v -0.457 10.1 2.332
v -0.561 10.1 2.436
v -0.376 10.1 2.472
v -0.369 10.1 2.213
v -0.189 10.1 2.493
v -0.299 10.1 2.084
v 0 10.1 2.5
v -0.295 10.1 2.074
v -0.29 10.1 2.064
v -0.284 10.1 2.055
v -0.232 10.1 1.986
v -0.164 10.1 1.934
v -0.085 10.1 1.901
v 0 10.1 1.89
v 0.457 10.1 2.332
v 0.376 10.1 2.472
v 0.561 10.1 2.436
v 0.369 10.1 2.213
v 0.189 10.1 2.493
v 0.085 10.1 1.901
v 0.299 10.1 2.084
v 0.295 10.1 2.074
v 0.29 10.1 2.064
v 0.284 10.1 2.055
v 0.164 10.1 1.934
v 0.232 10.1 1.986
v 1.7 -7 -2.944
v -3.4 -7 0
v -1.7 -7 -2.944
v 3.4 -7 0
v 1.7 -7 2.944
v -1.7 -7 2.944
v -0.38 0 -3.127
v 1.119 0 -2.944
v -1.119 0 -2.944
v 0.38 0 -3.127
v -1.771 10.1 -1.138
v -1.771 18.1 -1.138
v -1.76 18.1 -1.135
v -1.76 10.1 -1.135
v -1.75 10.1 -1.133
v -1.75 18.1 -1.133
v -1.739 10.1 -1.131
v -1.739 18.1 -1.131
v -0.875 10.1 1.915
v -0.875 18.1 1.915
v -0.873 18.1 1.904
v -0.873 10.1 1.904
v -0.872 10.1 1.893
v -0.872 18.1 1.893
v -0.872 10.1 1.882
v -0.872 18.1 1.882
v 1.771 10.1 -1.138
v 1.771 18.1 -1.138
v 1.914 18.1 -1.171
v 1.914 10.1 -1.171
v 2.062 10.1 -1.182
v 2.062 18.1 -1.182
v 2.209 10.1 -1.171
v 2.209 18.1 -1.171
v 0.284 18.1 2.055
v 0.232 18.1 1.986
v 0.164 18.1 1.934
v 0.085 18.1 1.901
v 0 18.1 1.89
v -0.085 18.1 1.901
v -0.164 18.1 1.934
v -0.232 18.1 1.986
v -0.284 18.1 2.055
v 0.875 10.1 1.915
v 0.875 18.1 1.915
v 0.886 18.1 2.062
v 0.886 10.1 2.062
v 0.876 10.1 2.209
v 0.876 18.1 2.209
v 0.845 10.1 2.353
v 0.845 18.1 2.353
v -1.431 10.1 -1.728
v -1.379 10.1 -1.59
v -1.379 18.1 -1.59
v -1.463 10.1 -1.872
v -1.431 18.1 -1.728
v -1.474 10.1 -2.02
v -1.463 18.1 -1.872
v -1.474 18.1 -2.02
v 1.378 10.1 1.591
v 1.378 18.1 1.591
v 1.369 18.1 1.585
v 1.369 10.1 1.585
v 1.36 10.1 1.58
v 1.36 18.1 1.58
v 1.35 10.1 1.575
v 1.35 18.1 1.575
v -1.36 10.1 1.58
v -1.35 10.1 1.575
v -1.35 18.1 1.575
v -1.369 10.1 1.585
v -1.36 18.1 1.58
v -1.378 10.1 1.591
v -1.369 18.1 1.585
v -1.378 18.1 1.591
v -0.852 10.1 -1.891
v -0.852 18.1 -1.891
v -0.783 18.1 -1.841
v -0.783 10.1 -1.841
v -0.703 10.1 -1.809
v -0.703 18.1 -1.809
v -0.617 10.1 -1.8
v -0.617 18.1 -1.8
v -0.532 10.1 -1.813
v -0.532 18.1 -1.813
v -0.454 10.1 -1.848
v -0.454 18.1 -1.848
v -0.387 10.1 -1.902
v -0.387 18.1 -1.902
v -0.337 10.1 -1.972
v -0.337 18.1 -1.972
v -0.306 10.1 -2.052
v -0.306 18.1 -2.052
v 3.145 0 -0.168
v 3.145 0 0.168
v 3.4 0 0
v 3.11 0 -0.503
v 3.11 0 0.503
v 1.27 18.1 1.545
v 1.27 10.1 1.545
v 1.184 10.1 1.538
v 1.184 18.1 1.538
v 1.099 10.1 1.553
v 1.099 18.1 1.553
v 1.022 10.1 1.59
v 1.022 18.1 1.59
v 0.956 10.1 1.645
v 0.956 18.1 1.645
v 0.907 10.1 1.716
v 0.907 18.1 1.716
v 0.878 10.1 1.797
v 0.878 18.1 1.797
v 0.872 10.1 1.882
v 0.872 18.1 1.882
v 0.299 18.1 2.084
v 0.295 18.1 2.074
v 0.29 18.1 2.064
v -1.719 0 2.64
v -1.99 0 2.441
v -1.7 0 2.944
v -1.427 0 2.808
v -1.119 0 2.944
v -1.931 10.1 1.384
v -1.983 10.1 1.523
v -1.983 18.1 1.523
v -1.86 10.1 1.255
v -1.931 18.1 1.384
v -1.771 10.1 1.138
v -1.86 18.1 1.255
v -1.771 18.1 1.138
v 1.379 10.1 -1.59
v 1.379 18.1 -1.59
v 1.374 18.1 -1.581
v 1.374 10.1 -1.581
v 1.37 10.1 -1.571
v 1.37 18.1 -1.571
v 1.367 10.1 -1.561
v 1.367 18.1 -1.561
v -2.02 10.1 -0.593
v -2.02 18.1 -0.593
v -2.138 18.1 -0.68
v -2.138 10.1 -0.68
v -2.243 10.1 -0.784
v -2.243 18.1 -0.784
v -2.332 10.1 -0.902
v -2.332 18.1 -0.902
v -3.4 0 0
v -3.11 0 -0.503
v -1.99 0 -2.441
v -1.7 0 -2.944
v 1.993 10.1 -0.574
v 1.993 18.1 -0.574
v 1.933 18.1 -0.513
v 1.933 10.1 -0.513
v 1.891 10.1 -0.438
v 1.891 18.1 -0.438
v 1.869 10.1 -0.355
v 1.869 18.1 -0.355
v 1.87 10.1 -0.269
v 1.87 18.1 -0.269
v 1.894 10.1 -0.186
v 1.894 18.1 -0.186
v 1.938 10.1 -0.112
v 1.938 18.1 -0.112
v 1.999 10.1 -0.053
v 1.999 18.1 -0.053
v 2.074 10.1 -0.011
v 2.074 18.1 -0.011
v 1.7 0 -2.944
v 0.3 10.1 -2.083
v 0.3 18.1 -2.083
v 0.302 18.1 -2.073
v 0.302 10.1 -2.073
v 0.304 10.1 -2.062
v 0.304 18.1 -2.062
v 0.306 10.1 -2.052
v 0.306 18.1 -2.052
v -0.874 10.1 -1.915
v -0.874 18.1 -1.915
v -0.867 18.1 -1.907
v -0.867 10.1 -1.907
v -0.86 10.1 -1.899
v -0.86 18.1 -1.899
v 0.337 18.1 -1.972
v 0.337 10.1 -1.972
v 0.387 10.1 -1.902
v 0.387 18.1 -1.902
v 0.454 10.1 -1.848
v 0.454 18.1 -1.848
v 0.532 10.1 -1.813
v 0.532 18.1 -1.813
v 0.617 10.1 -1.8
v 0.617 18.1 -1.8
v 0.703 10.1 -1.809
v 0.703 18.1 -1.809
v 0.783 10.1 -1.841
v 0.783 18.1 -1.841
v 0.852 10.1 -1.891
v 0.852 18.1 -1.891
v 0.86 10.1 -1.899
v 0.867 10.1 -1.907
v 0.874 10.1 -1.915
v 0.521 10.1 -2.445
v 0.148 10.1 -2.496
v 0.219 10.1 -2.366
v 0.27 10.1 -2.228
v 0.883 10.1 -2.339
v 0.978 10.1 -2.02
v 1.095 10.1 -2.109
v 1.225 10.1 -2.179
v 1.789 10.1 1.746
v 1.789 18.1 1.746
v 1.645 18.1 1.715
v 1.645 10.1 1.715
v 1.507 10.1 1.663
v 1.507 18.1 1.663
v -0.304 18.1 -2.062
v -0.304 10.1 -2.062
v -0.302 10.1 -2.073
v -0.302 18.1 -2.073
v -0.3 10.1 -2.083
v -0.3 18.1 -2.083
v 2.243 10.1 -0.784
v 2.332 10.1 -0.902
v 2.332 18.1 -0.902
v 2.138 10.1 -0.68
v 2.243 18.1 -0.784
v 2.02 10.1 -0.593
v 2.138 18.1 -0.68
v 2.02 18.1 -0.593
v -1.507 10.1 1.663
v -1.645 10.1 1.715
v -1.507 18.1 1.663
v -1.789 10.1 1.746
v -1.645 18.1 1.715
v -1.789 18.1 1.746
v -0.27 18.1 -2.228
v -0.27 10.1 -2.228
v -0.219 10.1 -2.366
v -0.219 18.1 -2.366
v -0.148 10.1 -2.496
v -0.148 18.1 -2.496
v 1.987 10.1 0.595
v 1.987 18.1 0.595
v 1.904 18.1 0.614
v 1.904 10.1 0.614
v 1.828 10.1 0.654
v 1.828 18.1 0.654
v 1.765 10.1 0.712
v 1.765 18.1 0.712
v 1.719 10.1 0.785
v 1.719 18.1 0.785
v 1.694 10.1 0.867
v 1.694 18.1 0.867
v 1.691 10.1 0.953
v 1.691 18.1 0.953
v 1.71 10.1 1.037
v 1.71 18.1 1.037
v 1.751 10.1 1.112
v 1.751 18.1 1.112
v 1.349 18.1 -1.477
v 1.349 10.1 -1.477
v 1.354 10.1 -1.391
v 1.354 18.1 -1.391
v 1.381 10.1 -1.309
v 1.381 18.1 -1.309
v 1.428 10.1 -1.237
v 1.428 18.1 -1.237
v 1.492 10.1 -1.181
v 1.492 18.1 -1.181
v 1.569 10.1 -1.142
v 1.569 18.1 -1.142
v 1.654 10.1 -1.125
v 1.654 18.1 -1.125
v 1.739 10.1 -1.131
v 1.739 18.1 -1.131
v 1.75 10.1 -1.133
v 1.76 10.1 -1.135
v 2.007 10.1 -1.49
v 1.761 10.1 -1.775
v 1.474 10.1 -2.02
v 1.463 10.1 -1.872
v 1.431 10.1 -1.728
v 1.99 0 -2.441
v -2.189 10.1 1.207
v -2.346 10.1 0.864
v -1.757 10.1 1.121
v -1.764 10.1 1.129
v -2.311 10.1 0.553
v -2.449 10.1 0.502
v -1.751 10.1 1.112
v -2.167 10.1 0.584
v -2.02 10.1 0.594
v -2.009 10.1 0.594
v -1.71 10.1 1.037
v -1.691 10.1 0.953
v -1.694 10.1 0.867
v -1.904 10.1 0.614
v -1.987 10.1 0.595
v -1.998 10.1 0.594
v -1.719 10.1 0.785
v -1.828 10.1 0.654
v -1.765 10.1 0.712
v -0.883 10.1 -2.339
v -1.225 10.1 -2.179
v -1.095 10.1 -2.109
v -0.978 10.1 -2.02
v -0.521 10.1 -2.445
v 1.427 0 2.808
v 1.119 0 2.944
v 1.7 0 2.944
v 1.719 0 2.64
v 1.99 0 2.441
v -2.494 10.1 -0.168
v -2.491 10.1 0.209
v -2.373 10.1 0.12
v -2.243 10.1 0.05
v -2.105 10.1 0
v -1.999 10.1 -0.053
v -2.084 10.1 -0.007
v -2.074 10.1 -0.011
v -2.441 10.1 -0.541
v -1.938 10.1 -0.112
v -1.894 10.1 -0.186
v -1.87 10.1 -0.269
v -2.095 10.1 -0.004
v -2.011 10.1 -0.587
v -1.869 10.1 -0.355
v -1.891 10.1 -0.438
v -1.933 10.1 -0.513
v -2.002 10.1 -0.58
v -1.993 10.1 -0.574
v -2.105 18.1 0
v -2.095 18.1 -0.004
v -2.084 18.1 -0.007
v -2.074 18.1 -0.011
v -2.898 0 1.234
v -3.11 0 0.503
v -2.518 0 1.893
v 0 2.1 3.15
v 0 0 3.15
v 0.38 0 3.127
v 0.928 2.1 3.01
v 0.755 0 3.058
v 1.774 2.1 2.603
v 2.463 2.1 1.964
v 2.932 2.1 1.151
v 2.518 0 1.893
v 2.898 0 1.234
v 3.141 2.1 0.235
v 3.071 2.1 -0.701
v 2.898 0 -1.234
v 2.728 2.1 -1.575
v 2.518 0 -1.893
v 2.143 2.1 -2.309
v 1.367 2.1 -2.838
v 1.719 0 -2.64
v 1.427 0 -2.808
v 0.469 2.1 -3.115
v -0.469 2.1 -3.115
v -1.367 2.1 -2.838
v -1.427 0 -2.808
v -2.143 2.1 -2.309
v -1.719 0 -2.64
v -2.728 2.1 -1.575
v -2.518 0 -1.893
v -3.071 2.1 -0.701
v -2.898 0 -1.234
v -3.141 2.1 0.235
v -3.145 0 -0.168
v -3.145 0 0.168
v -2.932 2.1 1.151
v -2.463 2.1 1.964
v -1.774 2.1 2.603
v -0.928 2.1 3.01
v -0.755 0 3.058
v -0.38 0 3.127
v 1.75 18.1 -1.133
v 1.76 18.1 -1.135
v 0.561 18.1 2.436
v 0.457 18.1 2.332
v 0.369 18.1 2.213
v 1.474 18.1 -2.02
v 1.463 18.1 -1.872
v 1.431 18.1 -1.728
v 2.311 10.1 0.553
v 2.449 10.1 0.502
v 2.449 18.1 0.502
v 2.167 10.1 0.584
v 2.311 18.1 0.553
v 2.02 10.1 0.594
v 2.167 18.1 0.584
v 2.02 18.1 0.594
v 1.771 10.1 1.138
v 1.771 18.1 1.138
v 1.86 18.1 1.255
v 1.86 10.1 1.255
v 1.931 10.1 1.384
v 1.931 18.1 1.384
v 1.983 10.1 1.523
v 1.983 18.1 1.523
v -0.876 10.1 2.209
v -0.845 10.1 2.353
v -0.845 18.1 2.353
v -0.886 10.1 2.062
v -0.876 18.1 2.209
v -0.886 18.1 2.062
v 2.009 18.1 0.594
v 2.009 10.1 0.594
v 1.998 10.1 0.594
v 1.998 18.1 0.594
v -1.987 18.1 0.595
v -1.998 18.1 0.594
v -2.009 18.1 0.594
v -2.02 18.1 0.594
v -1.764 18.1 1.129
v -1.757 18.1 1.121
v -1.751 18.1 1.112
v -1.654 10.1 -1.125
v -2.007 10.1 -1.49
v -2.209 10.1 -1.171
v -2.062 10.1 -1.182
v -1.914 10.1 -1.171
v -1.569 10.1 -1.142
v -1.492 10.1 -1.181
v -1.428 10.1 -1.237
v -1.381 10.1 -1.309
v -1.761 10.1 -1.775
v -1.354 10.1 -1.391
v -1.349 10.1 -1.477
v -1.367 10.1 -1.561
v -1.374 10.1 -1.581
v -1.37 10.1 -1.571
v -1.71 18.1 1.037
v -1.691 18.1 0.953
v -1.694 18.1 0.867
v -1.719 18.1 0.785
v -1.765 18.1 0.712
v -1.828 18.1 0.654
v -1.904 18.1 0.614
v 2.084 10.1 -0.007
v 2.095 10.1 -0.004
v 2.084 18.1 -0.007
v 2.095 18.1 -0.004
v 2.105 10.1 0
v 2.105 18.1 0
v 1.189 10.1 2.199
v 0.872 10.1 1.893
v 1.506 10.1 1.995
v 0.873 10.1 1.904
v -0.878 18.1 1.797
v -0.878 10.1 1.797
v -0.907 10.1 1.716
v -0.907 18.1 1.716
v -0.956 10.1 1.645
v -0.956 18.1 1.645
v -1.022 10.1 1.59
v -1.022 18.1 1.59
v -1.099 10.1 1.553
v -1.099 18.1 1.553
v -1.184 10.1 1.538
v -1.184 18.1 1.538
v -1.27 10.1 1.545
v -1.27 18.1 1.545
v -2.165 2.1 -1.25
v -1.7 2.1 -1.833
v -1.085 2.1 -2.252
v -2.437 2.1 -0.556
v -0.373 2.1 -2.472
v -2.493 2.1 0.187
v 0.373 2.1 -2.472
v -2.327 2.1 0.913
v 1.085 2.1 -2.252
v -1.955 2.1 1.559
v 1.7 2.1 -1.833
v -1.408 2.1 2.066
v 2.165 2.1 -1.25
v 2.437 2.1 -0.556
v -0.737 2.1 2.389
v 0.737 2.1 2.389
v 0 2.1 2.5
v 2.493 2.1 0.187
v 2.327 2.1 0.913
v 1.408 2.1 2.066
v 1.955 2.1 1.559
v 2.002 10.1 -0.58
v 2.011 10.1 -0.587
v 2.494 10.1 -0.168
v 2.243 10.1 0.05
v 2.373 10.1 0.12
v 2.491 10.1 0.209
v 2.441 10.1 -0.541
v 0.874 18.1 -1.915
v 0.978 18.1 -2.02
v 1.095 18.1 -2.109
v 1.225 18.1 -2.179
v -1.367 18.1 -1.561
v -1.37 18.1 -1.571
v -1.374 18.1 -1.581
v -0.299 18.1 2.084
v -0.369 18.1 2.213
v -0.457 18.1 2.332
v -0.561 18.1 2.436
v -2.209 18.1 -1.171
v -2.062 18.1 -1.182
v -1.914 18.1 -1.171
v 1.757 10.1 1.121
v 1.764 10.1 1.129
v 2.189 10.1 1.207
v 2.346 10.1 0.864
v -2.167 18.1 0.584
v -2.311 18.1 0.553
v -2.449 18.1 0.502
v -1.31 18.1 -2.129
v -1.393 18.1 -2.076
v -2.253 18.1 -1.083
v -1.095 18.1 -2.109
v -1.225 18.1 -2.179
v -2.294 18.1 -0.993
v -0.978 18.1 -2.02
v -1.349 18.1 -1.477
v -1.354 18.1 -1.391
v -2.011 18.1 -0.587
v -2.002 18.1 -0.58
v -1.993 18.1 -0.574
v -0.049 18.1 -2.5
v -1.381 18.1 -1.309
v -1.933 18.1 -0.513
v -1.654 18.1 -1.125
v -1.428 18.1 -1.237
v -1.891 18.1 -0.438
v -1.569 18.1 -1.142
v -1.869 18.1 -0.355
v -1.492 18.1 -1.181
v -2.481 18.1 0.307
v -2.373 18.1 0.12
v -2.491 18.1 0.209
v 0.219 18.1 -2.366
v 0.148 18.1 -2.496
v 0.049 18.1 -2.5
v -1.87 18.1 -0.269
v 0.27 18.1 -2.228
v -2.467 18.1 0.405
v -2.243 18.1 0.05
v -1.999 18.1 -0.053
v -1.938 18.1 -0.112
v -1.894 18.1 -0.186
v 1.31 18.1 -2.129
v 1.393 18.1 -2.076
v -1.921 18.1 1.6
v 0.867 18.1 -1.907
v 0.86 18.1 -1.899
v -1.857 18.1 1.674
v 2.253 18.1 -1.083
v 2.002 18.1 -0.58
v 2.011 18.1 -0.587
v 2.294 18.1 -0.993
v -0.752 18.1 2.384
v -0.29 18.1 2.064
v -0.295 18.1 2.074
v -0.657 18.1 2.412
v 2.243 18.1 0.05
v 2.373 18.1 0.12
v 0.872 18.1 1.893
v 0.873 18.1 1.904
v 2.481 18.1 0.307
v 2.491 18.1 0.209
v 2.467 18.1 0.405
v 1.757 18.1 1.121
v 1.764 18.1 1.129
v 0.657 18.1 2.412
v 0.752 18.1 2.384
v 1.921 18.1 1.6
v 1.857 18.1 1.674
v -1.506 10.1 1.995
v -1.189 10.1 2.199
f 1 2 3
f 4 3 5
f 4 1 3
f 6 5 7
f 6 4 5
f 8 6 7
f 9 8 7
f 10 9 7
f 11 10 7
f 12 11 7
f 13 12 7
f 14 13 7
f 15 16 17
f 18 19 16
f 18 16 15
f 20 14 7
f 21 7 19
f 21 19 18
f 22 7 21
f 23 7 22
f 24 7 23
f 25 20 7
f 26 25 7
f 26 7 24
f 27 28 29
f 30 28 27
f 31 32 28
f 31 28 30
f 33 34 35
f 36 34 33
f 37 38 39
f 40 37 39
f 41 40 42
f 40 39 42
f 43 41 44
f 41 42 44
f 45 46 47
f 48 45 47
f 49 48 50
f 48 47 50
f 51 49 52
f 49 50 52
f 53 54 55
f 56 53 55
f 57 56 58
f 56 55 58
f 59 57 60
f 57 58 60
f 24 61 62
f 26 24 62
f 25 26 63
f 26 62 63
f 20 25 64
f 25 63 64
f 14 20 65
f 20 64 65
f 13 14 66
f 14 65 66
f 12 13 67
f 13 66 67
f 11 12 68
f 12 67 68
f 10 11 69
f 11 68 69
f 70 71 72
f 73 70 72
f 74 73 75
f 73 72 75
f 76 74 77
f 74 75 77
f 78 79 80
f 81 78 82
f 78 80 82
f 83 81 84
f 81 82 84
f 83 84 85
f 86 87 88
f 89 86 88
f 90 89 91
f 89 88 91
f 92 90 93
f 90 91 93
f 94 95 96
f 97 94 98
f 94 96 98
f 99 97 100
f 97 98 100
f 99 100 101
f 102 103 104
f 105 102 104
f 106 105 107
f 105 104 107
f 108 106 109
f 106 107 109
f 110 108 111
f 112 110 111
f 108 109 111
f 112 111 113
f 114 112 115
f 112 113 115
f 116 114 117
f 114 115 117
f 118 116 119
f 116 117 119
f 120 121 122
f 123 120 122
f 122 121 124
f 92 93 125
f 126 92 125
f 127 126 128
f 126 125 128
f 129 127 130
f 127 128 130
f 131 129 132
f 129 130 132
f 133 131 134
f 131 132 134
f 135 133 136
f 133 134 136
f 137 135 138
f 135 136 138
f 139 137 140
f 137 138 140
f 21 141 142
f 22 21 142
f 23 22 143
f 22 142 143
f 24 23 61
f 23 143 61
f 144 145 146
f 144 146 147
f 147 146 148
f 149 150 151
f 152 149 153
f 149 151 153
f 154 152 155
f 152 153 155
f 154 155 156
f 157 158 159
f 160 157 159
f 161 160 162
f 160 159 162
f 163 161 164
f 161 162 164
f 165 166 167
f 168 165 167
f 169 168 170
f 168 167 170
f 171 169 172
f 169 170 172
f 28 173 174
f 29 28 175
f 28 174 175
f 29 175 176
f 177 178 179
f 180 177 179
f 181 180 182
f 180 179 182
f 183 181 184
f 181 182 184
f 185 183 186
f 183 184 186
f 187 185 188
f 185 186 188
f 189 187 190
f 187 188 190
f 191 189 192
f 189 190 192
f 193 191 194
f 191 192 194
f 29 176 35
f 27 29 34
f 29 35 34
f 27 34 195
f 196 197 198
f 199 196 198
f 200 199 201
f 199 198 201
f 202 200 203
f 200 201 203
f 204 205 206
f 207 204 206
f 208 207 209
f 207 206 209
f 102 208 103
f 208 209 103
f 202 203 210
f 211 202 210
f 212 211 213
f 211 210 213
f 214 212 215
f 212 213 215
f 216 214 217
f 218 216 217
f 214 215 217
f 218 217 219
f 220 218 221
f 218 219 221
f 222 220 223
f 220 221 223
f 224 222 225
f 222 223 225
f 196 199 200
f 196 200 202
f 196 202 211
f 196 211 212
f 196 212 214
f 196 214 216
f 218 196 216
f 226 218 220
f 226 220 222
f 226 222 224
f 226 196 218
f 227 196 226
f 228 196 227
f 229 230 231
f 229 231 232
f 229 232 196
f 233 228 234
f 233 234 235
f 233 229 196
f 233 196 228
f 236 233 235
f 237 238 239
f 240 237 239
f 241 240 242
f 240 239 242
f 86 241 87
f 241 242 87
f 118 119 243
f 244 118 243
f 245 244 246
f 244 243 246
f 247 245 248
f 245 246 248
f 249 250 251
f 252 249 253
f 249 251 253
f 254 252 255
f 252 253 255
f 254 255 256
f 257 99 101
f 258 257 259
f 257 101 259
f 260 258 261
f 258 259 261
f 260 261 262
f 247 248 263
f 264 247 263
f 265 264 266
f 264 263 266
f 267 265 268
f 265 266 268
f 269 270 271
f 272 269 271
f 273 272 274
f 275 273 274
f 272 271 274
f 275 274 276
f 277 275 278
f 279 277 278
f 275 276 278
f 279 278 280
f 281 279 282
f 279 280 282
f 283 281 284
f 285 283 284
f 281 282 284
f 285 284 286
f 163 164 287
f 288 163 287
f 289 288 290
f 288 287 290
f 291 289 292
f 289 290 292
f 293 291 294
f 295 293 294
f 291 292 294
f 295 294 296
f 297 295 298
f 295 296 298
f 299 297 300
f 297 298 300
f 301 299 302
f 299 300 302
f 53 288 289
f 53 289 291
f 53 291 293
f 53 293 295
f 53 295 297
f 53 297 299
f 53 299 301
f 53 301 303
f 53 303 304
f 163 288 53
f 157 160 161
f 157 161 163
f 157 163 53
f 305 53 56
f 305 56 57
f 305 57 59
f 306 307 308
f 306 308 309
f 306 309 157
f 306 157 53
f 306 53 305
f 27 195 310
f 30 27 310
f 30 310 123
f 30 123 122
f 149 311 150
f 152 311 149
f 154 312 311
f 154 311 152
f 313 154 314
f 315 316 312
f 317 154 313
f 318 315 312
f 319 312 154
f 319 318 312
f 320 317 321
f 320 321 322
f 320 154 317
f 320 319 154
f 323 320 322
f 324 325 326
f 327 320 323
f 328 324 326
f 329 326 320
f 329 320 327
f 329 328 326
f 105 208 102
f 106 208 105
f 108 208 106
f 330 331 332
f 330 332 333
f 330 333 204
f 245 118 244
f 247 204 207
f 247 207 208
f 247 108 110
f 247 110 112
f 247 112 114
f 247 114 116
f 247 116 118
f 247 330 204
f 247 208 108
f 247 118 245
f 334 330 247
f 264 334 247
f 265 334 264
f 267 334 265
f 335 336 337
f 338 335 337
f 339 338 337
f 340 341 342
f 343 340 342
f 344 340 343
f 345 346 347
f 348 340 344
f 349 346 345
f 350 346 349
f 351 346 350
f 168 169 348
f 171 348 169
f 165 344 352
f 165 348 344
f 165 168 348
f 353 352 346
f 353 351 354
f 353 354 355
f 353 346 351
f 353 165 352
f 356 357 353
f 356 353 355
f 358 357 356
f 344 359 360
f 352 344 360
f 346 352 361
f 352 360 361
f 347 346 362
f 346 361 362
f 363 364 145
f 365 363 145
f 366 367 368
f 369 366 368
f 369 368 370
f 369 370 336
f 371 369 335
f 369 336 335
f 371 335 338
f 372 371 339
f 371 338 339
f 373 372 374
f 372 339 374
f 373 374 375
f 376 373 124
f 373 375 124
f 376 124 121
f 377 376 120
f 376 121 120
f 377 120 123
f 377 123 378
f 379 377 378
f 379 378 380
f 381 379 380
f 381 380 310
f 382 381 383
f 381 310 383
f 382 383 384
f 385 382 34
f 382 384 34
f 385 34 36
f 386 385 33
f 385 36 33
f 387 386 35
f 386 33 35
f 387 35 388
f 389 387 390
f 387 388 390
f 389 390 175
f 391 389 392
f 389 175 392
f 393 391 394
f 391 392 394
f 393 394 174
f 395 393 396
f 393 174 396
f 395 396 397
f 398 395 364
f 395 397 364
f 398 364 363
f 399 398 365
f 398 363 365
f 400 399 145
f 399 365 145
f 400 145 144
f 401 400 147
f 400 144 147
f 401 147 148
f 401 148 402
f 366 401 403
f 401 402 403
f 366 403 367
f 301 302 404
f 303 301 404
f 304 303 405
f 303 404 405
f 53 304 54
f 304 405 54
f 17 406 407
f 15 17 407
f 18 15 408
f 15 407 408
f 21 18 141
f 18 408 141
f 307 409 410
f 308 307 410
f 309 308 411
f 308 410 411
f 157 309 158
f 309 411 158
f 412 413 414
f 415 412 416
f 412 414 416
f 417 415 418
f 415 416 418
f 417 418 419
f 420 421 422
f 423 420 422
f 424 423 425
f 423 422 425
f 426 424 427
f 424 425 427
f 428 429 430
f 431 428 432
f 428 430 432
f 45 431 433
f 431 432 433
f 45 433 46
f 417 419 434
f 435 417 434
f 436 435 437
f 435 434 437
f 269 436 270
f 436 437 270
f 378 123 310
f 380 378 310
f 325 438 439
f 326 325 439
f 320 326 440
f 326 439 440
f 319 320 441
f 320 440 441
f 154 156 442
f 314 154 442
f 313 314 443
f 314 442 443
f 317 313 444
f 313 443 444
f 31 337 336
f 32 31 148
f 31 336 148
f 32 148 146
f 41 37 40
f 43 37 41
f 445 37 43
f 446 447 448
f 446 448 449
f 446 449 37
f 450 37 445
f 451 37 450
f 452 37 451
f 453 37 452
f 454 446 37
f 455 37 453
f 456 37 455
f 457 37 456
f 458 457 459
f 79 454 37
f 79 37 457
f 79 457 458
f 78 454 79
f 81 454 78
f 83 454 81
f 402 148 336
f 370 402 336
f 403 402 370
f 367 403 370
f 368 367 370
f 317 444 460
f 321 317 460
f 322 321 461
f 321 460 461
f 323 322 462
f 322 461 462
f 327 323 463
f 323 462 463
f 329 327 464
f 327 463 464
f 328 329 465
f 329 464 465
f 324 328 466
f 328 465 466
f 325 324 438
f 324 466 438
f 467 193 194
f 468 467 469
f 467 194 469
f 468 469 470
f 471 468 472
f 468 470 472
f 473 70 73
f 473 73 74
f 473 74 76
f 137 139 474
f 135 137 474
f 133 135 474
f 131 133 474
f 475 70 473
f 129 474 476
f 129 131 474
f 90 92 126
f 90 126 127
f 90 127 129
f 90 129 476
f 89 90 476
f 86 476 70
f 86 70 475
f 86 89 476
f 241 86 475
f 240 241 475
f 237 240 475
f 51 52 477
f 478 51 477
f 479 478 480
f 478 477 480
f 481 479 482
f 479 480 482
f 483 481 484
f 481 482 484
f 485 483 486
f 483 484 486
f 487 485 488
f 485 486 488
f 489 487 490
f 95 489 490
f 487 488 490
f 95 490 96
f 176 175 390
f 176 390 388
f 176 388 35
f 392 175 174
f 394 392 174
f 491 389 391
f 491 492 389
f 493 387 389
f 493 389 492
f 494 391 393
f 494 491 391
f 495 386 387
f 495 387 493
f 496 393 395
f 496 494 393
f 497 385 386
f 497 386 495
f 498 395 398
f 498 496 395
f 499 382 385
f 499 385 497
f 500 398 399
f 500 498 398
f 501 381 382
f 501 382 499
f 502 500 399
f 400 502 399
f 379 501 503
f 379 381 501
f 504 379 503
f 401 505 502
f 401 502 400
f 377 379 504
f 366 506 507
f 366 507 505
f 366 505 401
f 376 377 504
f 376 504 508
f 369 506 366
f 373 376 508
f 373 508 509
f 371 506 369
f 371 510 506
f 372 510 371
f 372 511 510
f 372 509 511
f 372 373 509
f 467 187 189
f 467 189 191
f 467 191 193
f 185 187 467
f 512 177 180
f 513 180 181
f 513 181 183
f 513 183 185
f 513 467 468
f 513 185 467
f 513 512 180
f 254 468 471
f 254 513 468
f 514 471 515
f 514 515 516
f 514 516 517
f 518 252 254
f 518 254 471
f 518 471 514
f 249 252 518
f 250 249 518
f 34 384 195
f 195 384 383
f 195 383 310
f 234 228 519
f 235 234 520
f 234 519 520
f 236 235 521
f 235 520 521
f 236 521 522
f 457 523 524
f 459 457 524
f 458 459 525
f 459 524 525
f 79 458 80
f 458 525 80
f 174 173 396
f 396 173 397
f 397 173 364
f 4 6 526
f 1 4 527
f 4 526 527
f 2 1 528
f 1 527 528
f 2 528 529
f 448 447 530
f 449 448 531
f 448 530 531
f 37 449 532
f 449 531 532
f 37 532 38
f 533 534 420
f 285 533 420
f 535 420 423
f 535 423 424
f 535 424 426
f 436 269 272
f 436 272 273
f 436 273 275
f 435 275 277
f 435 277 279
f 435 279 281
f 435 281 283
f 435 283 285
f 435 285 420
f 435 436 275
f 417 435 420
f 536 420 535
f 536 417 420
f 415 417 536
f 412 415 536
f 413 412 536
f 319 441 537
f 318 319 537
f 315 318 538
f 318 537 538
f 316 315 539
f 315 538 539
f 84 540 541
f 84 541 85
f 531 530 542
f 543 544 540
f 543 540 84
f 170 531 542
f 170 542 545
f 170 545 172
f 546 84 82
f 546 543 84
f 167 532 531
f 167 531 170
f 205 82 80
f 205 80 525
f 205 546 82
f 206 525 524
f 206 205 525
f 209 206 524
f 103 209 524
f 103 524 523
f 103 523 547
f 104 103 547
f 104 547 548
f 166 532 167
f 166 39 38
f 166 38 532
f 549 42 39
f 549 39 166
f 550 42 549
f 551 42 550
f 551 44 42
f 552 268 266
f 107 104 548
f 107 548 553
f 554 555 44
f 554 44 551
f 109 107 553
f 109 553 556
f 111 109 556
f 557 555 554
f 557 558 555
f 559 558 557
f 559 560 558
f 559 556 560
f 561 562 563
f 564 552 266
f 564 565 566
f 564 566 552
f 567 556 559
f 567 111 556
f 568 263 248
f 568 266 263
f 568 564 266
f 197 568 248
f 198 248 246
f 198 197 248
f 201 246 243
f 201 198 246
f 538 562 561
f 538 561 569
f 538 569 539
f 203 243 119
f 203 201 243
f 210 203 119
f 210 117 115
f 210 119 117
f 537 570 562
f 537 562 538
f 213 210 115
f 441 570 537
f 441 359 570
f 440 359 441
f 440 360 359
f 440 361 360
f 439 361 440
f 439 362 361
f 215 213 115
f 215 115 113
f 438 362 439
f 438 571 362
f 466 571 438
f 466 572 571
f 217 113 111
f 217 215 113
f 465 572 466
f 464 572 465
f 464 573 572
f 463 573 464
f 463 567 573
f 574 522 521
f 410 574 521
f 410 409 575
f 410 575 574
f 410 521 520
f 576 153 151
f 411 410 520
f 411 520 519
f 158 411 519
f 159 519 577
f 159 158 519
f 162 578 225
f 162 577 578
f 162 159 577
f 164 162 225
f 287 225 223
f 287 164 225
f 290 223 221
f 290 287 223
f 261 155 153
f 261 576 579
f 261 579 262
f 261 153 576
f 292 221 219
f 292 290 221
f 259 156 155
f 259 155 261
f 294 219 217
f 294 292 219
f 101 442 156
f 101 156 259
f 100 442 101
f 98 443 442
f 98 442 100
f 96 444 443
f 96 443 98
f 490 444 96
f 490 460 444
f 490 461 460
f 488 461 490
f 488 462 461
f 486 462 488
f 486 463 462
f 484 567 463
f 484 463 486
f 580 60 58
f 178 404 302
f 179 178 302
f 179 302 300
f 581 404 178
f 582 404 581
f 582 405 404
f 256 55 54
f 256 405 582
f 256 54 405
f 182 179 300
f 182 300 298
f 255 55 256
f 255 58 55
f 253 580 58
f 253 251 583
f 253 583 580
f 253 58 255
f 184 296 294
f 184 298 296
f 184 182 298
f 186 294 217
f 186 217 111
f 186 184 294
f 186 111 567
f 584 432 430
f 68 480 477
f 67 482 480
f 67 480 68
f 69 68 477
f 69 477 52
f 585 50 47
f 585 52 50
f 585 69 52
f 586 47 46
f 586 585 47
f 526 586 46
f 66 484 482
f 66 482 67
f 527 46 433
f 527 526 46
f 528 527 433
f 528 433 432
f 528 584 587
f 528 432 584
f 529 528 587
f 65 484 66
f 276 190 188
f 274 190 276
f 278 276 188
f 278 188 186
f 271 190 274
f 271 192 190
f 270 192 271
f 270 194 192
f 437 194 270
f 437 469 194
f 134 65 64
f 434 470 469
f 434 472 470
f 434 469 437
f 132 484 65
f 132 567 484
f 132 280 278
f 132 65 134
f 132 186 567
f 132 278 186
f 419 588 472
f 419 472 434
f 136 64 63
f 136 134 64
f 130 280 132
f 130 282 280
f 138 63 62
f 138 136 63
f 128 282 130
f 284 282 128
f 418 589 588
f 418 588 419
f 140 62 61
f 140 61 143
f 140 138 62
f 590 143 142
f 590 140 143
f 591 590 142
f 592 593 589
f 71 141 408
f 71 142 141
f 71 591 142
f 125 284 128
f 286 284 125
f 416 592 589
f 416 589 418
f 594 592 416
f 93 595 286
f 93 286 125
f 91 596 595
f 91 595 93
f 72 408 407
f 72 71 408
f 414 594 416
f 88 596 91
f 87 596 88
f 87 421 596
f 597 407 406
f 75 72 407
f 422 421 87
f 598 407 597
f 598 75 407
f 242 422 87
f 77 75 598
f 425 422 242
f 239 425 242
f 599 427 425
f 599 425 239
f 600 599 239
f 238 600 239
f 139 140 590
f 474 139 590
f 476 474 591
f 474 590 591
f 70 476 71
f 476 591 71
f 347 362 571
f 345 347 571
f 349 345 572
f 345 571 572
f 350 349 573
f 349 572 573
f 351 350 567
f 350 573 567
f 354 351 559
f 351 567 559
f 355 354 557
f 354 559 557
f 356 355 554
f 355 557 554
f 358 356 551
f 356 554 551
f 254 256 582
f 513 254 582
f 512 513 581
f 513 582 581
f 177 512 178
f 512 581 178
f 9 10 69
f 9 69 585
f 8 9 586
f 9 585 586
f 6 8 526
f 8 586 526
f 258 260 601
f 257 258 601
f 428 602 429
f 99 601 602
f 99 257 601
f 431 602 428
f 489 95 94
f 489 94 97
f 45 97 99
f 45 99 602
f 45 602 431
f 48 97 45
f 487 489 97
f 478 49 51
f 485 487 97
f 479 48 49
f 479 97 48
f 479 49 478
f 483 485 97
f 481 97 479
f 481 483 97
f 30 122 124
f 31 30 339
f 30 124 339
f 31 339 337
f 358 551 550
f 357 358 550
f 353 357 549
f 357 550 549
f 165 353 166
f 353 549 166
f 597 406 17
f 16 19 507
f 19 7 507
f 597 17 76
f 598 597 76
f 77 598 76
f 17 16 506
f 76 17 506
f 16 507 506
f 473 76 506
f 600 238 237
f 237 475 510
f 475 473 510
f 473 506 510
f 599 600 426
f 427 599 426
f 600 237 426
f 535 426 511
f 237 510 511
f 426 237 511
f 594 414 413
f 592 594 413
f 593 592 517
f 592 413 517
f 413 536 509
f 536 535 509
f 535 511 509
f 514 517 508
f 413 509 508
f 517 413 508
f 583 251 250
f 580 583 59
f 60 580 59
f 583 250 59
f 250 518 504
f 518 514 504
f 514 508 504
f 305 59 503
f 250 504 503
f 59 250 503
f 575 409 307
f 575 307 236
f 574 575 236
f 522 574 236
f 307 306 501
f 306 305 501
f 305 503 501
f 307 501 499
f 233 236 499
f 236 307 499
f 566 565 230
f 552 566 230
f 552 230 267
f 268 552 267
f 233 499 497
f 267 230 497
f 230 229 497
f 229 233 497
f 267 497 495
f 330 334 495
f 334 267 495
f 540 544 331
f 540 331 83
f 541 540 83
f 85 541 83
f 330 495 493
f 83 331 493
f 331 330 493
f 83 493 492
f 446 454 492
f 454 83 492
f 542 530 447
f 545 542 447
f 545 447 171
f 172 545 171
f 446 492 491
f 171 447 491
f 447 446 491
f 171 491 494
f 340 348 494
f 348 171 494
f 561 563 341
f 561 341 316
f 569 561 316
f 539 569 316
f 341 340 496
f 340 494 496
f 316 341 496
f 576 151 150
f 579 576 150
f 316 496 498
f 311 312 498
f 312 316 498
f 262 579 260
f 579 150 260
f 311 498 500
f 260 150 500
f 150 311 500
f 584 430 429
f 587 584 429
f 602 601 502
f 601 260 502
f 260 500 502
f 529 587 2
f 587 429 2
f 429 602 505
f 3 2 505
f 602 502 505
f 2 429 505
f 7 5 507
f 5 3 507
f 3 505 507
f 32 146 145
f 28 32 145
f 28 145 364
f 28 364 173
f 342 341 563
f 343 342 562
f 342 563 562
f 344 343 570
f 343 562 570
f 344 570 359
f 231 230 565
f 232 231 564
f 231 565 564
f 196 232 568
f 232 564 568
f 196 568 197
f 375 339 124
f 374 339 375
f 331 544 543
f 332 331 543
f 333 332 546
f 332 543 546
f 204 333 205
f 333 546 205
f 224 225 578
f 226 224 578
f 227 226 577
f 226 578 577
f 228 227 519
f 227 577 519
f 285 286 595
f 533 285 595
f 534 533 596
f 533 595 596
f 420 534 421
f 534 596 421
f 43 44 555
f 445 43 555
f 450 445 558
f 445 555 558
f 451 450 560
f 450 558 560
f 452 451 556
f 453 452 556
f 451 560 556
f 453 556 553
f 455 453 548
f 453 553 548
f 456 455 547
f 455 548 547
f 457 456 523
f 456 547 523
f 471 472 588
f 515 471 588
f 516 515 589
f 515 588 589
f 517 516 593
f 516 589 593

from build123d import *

# Parameters (mm, degrees)
SKETCH1_R           = 3.15
BOSS_EXTRUDE1_DEPTH = 2.1
SKETCH2_R           = 2.5
BOSS_EXTRUDE3_DEPTH = 16
SKETCH8_OUTSIDE_W   = 12.334
SKETCH8_OUTSIDE_H   = 12.334
CUT_EXTRUDE5_DEPTH  = 8
BOSS_EXTRUDE4_DEPTH = 7


with BuildPart() as part:
    # Sketch1 → Boss-Extrude1 (new body)
    with BuildSketch(Plane(origin=(0, 0, 0), x_dir=(1, 0, 0), z_dir=(0, 1, 0))):
        with Locations(Location((0, 0, 0), (0, 0, 270))):
            Circle(SKETCH1_R)
    extrude(amount=BOSS_EXTRUDE1_DEPTH)

    # Sketch2 → Boss-Extrude3 (add)
    with BuildSketch(Plane(origin=(0, 2.1, 0), x_dir=(1, 0, 0), z_dir=(0, 1, 0))):
        with Locations(Location((0, 0, 0), (0, 0, 270))):
            Circle(SKETCH2_R)
    extrude(amount=BOSS_EXTRUDE3_DEPTH)

    # Sketch8 outside → Cut-Extrude5 (cut)
    with BuildSketch(Plane(origin=(0, 18.1, 0), x_dir=(1, 0, 0), z_dir=(0, 1, 0))):
        Rectangle(SKETCH8_OUTSIDE_W, SKETCH8_OUTSIDE_H)
        with BuildLine():
            ThreePointArc((-0.874874584, -1.914509945), (-0.872847435, -1.898524314), (-0.871608771, -1.882458342))
            ThreePointArc((-0.871608771, -1.882458342), (-1.021648634, -1.589716304), (-1.350264969, -1.574844682))
            ThreePointArc((-1.350264969, -1.574844682), (-1.364364531, -1.582645457), (-1.378063464, -1.591130087))
            ThreePointArc((-1.378063464, -1.591130087), (-1.575187068, -1.691186219), (-1.789333192, -1.746053167))
            ThreePointArc((-1.789333192, -1.746053167), (-1.889436652, -1.637206179), (-1.982929527, -1.522631086))
            ThreePointArc((-1.982929527, -1.522631086), (-1.898144875, -1.318473041), (-1.771053556, -1.137595344))
            ThreePointArc((-1.771053556, -1.137595344), (-1.760705725, -1.125243335), (-1.750977775, -1.112397452))
            ThreePointArc((-1.750977775, -1.112397452), (-1.718931045, -0.785009505), (-1.987340492, -0.594835296))
            ThreePointArc((-1.987340492, -0.594835296), (-2.003419215, -0.593774926), (-2.019530629, -0.593506449))
            ThreePointArc((-2.019530629, -0.593506449), (-2.239455986, -0.571105958), (-2.449270481, -0.501486836))
            ThreePointArc((-2.449270481, -0.501486836), (-2.474635746, -0.355798906), (-2.491342985, -0.20886614))
            ThreePointArc((-2.491342985, -0.20886614), (-2.309641425, -0.082955507), (-2.104935538, 0.00049774))
            ThreePointArc((-2.104935538, 0.00049774), (-2.089552388, 0.005294452), (-2.074423707, 0.010841769))
            ThreePointArc((-2.074423707, 0.010841769), (-1.870464994, 0.268932266), (-1.99344945, 0.574030094))
            ThreePointArc((-1.99344945, 0.574030094), (-2.006402454, 0.583614948), (-2.019811088, 0.592551293))
            ThreePointArc((-2.019811088, 0.592551293), (-2.192713451, 0.73029641), (-2.331581698, 0.902298023))
            ThreePointArc((-2.331581698, 0.902298023), (-2.274155475, 1.038572006), (-2.208772648, 1.17121233))
            ThreePointArc((-2.208772648, 1.17121233), (-1.987843141, 1.178899814), (-1.770515359, 1.138432796))
            ThreePointArc((-1.770515359, 1.138432796), (-1.754980932, 1.134151287), (-1.739254769, 1.130638805))
            ThreePointArc((-1.739254769, 1.130638805), (-1.428139525, 1.237489942), (-1.366652294, 1.560644985))
            ThreePointArc((-1.366652294, 1.560644985), (-1.37236709, 1.5757112), (-1.378815798, 1.590478186))
            ThreePointArc((-1.378815798, 1.590478186), (-1.449799889, 1.799834828), (-1.4736322, 2.019609634))
            ThreePointArc((-1.4736322, 2.019609634), (-1.351646909, 2.103203644), (-1.224932602, 2.179439161))
            ThreePointArc((-1.224932602, 2.179439161), (-1.034918706, 2.066462775), (-0.873969064, 1.914923482))
            ThreePointArc((-0.873969064, 1.914923482), (-0.86321543, 1.902923103), (-0.851884731, 1.891466009))
            ThreePointArc((-0.851884731, 1.891466009), (-0.532389846, 1.813153306), (-0.30595269, 2.05176612))
            ThreePointArc((-0.30595269, 2.05176612), (-0.302614872, 2.067530279), (-0.300056235, 2.083439494))
            ThreePointArc((-0.300056235, 2.083439494), (-0.246585106, 2.297938405), (-0.14781489, 2.495709457))
            ThreePointArc((-0.14781489, 2.495709457), (-0.073939789, 2.498989364), (0, 2.500082986))
            ThreePointArc((0, 2.500082986), (0.073939789, 2.498989364), (0.14781489, 2.495709457))
            ThreePointArc((0.14781489, 2.495709457), (0.246585106, 2.297938405), (0.300056235, 2.083439494))
            ThreePointArc((0.300056235, 2.083439494), (0.302614872, 2.067530279), (0.30595269, 2.05176612))
            ThreePointArc((0.30595269, 2.05176612), (0.532389846, 1.813153306), (0.851884731, 1.891466009))
            ThreePointArc((0.851884731, 1.891466009), (0.86321543, 1.902923103), (0.873969064, 1.914923482))
            ThreePointArc((0.873969064, 1.914923482), (1.034918706, 2.066462775), (1.224932602, 2.179439161))
            ThreePointArc((1.224932602, 2.179439161), (1.351646909, 2.103203644), (1.4736322, 2.019609634))
            ThreePointArc((1.4736322, 2.019609634), (1.449799889, 1.799834828), (1.378815798, 1.590478186))
            ThreePointArc((1.378815798, 1.590478186), (1.37236709, 1.5757112), (1.366652294, 1.560644985))
            ThreePointArc((1.366652294, 1.560644985), (1.428139525, 1.237489942), (1.739254769, 1.130638805))
            ThreePointArc((1.739254769, 1.130638805), (1.754980932, 1.134151287), (1.770515359, 1.138432796))
            ThreePointArc((1.770515359, 1.138432796), (1.987843141, 1.178899814), (2.208772648, 1.17121233))
            ThreePointArc((2.208772648, 1.17121233), (2.274155475, 1.038572006), (2.331581698, 0.902298023))
            ThreePointArc((2.331581698, 0.902298023), (2.192713451, 0.73029641), (2.019811088, 0.592551293))
            ThreePointArc((2.019811088, 0.592551293), (2.006402454, 0.583614948), (1.99344945, 0.574030094))
            ThreePointArc((1.99344945, 0.574030094), (1.870464994, 0.268932266), (2.074423707, 0.010841769))
            ThreePointArc((2.074423707, 0.010841769), (2.089552388, 0.005294452), (2.104935538, 0.00049774))
            ThreePointArc((2.104935538, 0.00049774), (2.309641425, -0.082955507), (2.491342985, -0.20886614))
            ThreePointArc((2.491342985, -0.20886614), (2.474635746, -0.355798906), (2.449270481, -0.501486836))
            ThreePointArc((2.449270481, -0.501486836), (2.239455986, -0.571105958), (2.019530629, -0.593506449))
            ThreePointArc((2.019530629, -0.593506449), (2.003419215, -0.593774926), (1.987340492, -0.594835296))
            ThreePointArc((1.987340492, -0.594835296), (1.718931045, -0.785009505), (1.750977775, -1.112397452))
            ThreePointArc((1.750977775, -1.112397452), (1.760705725, -1.125243335), (1.771053556, -1.137595344))
            ThreePointArc((1.771053556, -1.137595344), (1.898144875, -1.318473041), (1.982929527, -1.522631086))
            ThreePointArc((1.982929527, -1.522631086), (1.889436652, -1.637206179), (1.789333192, -1.746053167))
            ThreePointArc((1.789333192, -1.746053167), (1.575187069, -1.691186219), (1.378063467, -1.591130087))
            ThreePointArc((1.378063467, -1.591130087), (1.364364533, -1.582645456), (1.350264971, -1.574844682))
            ThreePointArc((1.350264971, -1.574844682), (1.021648634, -1.589716304), (0.871608771, -1.882458343))
            ThreePointArc((0.871608771, -1.882458343), (0.872847435, -1.898524314), (0.874874584, -1.914509946))
            ThreePointArc((0.874874584, -1.914509946), (0.884000739, -2.135384701), (0.844949955, -2.352971421))
            ThreePointArc((0.844949955, -2.352971421), (0.704354772, -2.398812058), (0.561295258, -2.436259955))
            ThreePointArc((0.561295258, -2.436259955), (0.410807386, -2.274326806), (0.299070887, -2.083581165))
            ThreePointArc((0.299070887, -2.083581165), (0.292133749, -2.069037237), (0.284489859, -2.05485201))
            ThreePointArc((0.284489859, -2.05485201), (0, -1.88969941), (-0.284489859, -2.054852009))
            ThreePointArc((-0.284489859, -2.054852009), (-0.292133749, -2.069037237), (-0.299070887, -2.083581165))
            ThreePointArc((-0.299070887, -2.083581165), (-0.410807386, -2.274326806), (-0.561295258, -2.436259955))
            ThreePointArc((-0.561295258, -2.436259955), (-0.704354772, -2.398812058), (-0.844949955, -2.352971421))
            ThreePointArc((-0.844949955, -2.352971421), (-0.884000739, -2.135384701), (-0.874874584, -1.914509945))
        make_face(mode=Mode.SUBTRACT)
    extrude(amount=-CUT_EXTRUDE5_DEPTH, mode=Mode.SUBTRACT)

    # Sketch9 → Boss-Extrude4 (add)
    with BuildSketch(Plane.XZ):
        Polygon((3.4, 0), (1.7, 2.944486373), (-1.7, 2.944486373), (-3.4, 0), (-1.7, -2.944486373), (1.7, -2.944486373), align=None)
    extrude(amount=BOSS_EXTRUDE4_DEPTH)


solid = part.part
